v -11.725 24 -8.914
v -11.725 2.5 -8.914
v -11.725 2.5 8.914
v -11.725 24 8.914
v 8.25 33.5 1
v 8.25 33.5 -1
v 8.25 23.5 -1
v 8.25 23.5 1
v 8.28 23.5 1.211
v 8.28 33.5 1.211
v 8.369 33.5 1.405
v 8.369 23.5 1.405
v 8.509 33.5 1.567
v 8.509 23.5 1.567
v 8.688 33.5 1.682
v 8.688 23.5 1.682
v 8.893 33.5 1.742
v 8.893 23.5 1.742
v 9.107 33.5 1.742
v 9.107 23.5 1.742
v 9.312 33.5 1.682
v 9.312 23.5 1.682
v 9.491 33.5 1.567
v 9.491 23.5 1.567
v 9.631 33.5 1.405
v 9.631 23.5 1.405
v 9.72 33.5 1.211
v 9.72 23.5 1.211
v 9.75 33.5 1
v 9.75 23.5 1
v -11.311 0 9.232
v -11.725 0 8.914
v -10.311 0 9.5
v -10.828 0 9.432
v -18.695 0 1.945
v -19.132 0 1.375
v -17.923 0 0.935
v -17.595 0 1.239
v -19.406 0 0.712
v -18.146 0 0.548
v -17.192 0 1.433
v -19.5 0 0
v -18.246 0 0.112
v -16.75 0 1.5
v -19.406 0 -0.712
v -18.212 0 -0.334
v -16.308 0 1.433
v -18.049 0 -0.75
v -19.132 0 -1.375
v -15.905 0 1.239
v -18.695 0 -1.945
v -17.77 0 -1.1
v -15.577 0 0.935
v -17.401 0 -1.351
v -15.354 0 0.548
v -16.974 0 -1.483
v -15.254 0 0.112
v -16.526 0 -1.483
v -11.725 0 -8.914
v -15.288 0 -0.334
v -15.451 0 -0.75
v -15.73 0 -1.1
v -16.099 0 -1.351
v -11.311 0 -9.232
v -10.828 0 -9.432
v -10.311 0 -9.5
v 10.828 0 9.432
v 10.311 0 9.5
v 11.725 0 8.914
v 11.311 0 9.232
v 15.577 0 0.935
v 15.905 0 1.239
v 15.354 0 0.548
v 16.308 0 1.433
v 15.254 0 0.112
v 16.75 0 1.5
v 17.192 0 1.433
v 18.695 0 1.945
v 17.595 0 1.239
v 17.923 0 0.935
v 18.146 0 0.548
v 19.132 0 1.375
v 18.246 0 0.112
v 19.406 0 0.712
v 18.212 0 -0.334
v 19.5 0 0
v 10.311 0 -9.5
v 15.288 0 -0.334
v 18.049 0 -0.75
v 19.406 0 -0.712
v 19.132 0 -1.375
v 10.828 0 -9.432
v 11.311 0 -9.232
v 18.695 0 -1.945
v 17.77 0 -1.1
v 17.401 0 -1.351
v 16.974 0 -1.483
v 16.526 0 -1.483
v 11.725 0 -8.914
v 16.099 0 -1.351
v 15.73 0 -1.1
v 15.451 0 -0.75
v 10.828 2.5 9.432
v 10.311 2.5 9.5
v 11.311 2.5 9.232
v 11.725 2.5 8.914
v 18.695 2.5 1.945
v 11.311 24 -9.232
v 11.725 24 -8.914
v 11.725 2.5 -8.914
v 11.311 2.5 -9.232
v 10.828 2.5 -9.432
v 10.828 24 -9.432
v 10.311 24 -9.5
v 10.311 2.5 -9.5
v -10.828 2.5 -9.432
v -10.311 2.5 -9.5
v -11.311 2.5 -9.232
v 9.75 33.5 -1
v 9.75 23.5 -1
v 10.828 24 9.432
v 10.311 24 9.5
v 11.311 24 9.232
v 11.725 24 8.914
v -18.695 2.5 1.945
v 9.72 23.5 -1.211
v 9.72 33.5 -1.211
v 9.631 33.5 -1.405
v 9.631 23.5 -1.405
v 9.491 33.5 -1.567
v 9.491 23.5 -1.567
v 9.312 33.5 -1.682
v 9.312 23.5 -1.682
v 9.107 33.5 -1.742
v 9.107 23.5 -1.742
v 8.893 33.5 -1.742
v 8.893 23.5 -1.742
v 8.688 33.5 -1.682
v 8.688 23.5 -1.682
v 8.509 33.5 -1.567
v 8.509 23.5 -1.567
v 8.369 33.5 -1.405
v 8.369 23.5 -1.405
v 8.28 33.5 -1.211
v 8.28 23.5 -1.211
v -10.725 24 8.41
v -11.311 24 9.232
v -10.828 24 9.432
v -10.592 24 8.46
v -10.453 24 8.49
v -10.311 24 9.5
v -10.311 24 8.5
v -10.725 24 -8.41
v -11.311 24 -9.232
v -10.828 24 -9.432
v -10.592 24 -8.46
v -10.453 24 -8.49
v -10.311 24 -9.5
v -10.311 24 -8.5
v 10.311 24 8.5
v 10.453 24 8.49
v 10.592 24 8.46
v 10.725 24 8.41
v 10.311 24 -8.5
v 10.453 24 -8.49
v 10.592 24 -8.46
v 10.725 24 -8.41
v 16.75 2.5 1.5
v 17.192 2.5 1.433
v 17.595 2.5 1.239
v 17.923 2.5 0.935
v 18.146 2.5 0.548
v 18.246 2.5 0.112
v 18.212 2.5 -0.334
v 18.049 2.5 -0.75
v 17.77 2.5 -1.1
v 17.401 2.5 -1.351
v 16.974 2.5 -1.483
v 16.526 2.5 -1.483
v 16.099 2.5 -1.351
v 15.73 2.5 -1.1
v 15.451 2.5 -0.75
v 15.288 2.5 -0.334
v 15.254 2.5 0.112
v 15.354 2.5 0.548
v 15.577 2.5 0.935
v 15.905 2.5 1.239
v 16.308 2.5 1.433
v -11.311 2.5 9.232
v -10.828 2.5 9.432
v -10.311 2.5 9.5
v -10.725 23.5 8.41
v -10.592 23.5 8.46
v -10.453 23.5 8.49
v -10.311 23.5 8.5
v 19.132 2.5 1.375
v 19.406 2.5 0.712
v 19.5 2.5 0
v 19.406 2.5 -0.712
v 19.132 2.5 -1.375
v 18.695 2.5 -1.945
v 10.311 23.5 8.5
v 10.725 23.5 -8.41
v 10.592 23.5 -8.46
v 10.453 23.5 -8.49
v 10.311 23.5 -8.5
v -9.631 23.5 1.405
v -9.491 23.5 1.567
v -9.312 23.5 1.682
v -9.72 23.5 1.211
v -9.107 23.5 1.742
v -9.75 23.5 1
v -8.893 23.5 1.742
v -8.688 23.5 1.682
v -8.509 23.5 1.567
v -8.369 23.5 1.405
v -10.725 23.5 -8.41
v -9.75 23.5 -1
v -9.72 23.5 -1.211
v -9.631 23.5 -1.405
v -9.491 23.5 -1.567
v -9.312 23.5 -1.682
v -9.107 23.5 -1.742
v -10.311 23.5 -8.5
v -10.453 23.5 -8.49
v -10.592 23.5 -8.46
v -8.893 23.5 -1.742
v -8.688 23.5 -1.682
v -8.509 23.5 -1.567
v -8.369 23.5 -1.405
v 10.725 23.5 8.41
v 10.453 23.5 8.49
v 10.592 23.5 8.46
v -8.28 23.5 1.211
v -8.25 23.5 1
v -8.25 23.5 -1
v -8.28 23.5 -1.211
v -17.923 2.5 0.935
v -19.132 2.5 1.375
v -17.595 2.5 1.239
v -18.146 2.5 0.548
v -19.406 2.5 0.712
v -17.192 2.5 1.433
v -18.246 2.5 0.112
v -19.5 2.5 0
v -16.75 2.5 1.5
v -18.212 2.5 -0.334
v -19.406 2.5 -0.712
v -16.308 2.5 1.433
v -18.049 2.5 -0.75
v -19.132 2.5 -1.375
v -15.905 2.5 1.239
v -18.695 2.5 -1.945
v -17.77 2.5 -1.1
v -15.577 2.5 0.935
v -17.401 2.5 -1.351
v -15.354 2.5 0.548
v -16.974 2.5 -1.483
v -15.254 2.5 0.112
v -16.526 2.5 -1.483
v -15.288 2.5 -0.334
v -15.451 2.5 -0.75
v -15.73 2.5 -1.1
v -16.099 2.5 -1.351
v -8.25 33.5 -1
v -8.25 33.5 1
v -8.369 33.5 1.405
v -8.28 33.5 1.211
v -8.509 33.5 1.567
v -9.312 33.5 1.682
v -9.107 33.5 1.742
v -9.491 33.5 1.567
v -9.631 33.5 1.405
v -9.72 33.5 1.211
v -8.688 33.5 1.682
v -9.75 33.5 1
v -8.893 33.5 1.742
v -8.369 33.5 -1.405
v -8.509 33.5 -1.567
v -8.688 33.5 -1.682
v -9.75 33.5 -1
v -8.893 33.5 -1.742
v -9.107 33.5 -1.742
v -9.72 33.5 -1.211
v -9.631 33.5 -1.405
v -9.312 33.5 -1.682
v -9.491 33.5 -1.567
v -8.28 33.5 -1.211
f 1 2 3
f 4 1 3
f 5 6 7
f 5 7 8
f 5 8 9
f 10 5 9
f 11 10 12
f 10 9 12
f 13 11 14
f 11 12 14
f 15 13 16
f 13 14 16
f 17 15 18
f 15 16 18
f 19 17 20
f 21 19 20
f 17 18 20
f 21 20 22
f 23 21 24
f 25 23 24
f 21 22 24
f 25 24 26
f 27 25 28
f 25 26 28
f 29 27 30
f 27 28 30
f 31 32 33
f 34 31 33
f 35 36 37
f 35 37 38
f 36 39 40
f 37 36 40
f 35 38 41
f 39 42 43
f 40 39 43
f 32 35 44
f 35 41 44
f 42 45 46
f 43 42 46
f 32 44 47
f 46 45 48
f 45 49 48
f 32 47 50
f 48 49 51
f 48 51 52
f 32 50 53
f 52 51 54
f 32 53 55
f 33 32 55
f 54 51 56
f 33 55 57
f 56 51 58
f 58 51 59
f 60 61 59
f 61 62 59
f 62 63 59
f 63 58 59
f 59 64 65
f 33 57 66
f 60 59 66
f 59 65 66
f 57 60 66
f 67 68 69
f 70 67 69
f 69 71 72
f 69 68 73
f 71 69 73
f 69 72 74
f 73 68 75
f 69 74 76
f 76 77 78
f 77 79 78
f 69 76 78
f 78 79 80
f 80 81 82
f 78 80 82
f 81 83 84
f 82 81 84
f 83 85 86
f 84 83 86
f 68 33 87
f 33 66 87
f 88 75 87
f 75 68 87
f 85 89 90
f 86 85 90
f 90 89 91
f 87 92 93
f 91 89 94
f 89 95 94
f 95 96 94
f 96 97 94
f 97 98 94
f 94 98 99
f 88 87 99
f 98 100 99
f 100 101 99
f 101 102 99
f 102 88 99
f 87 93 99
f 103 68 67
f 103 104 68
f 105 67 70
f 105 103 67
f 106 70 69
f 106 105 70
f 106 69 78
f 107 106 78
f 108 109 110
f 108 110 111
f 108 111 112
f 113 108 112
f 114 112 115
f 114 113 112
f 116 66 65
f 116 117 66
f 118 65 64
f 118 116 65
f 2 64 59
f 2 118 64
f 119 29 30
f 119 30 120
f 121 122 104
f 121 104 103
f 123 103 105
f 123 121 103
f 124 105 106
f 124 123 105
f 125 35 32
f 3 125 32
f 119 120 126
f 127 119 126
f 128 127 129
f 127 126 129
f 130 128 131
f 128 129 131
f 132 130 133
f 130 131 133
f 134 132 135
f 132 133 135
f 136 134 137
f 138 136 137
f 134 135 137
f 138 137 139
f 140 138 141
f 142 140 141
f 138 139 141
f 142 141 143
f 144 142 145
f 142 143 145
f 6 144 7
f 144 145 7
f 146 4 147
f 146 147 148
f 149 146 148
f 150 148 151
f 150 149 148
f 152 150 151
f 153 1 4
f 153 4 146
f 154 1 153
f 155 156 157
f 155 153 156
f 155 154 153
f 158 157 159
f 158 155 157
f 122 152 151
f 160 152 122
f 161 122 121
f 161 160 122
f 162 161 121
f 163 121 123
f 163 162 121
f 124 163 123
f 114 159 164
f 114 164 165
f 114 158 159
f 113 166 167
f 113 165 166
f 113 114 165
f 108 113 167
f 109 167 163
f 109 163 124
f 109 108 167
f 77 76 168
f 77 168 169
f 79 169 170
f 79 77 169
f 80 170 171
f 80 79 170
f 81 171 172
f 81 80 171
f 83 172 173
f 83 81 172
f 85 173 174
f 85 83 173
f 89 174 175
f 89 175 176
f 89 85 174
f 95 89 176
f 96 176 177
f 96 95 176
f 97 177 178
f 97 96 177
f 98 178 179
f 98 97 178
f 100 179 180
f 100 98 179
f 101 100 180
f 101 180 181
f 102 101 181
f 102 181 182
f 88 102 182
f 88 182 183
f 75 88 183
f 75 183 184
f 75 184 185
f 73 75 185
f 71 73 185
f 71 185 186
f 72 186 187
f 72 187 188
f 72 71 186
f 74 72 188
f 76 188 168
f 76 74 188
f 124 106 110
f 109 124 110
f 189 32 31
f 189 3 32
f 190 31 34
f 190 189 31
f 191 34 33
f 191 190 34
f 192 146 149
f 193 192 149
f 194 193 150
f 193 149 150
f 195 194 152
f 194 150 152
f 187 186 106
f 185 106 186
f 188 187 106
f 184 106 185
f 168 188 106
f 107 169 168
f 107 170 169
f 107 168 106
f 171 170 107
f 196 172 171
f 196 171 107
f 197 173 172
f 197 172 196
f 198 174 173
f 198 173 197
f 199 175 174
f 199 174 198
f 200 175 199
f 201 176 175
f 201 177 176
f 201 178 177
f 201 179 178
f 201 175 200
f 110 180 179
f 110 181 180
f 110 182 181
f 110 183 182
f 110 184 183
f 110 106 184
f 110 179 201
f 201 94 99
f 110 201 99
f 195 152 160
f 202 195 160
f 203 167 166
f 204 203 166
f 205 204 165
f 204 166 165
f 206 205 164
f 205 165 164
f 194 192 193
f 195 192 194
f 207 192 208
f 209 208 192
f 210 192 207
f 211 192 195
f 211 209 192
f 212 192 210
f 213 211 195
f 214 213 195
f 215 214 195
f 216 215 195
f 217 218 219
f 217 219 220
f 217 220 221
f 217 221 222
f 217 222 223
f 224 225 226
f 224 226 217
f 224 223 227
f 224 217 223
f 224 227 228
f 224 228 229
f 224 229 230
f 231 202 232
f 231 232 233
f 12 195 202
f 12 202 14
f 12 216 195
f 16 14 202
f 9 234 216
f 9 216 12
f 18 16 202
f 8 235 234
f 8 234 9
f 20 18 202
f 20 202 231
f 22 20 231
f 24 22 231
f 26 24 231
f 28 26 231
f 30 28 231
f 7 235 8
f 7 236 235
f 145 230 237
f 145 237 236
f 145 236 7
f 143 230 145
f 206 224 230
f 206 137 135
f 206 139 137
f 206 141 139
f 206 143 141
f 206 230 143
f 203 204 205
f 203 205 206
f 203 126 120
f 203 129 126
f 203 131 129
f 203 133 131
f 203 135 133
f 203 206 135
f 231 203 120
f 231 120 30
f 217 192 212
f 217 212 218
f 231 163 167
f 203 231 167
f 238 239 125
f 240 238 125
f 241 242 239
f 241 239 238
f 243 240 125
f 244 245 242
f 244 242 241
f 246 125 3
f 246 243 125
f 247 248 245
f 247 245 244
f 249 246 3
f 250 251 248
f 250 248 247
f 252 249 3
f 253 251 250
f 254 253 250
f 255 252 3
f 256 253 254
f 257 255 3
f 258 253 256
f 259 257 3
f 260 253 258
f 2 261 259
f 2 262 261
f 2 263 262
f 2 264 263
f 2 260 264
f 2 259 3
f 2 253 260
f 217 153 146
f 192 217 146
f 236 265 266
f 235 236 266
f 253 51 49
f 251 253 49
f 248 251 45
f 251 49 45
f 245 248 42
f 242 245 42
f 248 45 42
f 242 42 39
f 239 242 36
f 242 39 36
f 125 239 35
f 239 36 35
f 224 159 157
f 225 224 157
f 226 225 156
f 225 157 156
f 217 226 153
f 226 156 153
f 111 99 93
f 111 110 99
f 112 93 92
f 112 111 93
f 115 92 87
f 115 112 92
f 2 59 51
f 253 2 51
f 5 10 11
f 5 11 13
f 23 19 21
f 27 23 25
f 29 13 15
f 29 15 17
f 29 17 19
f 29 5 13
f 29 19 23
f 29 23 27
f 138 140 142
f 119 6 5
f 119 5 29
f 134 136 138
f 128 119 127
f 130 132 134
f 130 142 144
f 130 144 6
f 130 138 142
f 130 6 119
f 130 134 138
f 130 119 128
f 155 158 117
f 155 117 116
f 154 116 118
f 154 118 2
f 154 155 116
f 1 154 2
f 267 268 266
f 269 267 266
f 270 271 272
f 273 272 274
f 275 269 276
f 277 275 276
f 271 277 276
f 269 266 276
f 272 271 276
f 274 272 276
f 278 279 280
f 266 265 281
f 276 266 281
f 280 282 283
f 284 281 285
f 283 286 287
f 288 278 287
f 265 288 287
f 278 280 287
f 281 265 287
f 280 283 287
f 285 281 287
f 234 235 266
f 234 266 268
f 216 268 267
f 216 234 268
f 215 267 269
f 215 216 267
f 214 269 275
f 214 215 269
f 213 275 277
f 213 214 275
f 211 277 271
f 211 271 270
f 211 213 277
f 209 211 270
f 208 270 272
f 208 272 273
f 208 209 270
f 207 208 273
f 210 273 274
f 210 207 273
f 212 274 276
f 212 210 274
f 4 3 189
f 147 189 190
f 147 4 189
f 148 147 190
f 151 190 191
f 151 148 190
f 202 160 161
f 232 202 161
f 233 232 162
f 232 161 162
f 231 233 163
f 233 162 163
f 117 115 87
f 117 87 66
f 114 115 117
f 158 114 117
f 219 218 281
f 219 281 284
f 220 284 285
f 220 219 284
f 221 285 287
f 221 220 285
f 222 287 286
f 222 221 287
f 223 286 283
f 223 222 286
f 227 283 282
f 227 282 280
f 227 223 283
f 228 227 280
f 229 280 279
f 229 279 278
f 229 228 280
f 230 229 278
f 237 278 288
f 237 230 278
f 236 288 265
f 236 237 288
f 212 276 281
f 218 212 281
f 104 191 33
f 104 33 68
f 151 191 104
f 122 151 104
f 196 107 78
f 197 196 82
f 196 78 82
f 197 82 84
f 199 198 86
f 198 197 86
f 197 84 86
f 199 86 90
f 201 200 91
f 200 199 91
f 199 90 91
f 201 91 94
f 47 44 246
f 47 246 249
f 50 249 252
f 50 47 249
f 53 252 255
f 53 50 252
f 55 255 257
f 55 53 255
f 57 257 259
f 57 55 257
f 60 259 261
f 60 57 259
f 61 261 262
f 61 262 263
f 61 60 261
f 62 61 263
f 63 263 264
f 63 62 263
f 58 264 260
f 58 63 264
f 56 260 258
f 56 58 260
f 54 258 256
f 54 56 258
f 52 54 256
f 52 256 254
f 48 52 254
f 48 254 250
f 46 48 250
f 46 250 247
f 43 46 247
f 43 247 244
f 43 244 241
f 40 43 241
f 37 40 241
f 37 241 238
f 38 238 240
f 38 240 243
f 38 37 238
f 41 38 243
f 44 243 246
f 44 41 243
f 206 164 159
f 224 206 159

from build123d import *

# Parameters (mm, degrees)
SKETCH1_R           = 2.75
SKETCH1_R_2         = 1.5
BOSS_EXTRUDE1_DEPTH = 2.5
FILLET1_R           = 2
BOSS_EXTRUDE2_START = 21.5
BOSS_EXTRUDE2_DEPTH = 21.5
CUT_EXTRUDE1_DEPTH  = 0.5
BOSS_EXTRUDE3_DEPTH = 10


with BuildPart() as part:
    # Sketch1 → Boss-Extrude1 (new body)
    # profile 1 of 3: a face of its own
    with BuildSketch(Plane(origin=(0, 0, 0), x_dir=(1, 0, 0), z_dir=(0, 1, 0))):
        with BuildLine():
            Line((11.139087297, 9.5), (-11.139087297, 9.5))
            Line((-11.139087297, 9.5), (-18.694543648, 1.944543648))
            ThreePointArc((-18.694543648, 1.944543648), (-15.697620561, 2.540668714), (-14, 0))
            ThreePointArc((-14, 0), (-15.697620561, -2.540668714), (-18.694543648, -1.944543648))
            Line((-18.694543648, -1.944543648), (-11.139087297, -9.5))
            Line((-11.139087297, -9.5), (11.139087297, -9.5))
            Line((11.139087297, -9.5), (18.694543648, -1.944543648))
            ThreePointArc((18.694543648, -1.944543648), (14, 0), (18.694543648, 1.944543648))
            Line((18.694543648, 1.944543648), (11.139087297, 9.5))
        make_face()
    # profile 2 of 3: a face of its own
    with BuildSketch(Plane(origin=(0, 0, 0), x_dir=(1, 0, 0), z_dir=(0, 1, 0))):
        with Locations((-16.75, 0)):
            Circle(SKETCH1_R)
        with Locations(Location((-16.75, 0, 0), (0, 0, 270))):
            Circle(SKETCH1_R_2, mode=Mode.SUBTRACT)
    # profile 3 of 3: a face of its own
    with BuildSketch(Plane(origin=(0, 0, 0), x_dir=(1, 0, 0), z_dir=(0, 1, 0))):
        with Locations((16.75, 0)):
            Circle(SKETCH1_R)
        with Locations(Location((16.75, 0, 0), (0, 0, 270))):
            Circle(SKETCH1_R_2, mode=Mode.SUBTRACT)
    extrude(amount=BOSS_EXTRUDE1_DEPTH)

    # Fillet1
    fillet1_edges = [part.edges().sort_by_distance(p)[0] for p in [
        (11.139087297, 1.25, 9.5),
        (-11.139087297, 1.25, 9.5),
        (-11.139087297, 1.25, -9.5),
        (11.139087297, 1.25, -9.5),
    ]]
    fillet(fillet1_edges, radius=FILLET1_R)

    # Sketch3 → Boss-Extrude2 (add)
    with BuildSketch(Plane(origin=(0, 2.5, 0), x_dir=(1, 0, 0), z_dir=(0, 1, 0)).offset(BOSS_EXTRUDE2_START)):
        with BuildLine():
            Line((10.310660172, 9.5), (-10.310660172, 9.5))
            ThreePointArc((-10.310660172, 9.5), (-11.076027037, 9.347759065), (-11.724873734, 8.914213562))
            Line((-11.724873734, 8.914213562), (-11.724873734, -8.914213562))
            ThreePointArc((-11.724873734, -8.914213562), (-11.076027037, -9.347759065), (-10.310660172, -9.5))
            Line((-10.310660172, -9.5), (10.310660172, -9.5))
            ThreePointArc((10.310660172, -9.5), (11.076027037, -9.347759065), (11.724873734, -8.914213562))
            Line((11.724873734, -8.914213562), (11.724873734, 8.914213562))
            ThreePointArc((11.724873734, 8.914213562), (11.076027037, 9.347759065), (10.310660172, 9.5))
        make_face()
    extrude(amount=-BOSS_EXTRUDE2_DEPTH)

    # Sketch4 → Cut-Extrude1 (cut)
    with BuildSketch(Plane(origin=(0, 24, 0), x_dir=(1, 0, 0), z_dir=(0, 1, 0))):
        with BuildLine():
            Line((10.724873734, -8.410179721), (10.724873734, 8.410179721))
            ThreePointArc((10.724873734, 8.410179721), (10.522580297, 8.47728699), (10.310660172, 8.5))
            Line((10.310660172, 8.5), (-10.310660172, 8.5))
            ThreePointArc((-10.310660172, 8.5), (-10.522580297, 8.47728699), (-10.724873734, 8.410179721))
            Line((-10.724873734, 8.410179721), (-10.724873734, -8.410179721))
            ThreePointArc((-10.724873734, -8.410179721), (-10.522580297, -8.47728699), (-10.310660172, -8.5))
            Line((-10.310660172, -8.5), (10.310660172, -8.5))
            ThreePointArc((10.310660172, -8.5), (10.522580297, -8.47728699), (10.724873734, -8.410179721))
        make_face()
    extrude(amount=-CUT_EXTRUDE1_DEPTH, mode=Mode.SUBTRACT)

    # Sketch5 → Boss-Extrude3 (add)
    with BuildSketch(Plane(origin=(0, 23.5, 0), x_dir=(1, 0, 0), z_dir=(0, 1, 0))):
        with BuildLine():
            Line((-8.25, 1), (-8.25, -1))
            ThreePointArc((-8.25, -1), (-9, -1.75), (-9.75, -1))
            Line((-9.75, -1), (-9.75, 1))
            ThreePointArc((-9.75, 1), (-9, 1.75), (-8.25, 1))
        make_face()
        with BuildLine():
            Line((8.25, 1), (8.25, -1))
            ThreePointArc((8.25, -1), (9, -1.75), (9.75, -1))
            Line((9.75, -1), (9.75, 1))
            ThreePointArc((9.75, 1), (9, 1.75), (8.25, 1))
        make_face()
    extrude(amount=BOSS_EXTRUDE3_DEPTH)


solid = part.part
